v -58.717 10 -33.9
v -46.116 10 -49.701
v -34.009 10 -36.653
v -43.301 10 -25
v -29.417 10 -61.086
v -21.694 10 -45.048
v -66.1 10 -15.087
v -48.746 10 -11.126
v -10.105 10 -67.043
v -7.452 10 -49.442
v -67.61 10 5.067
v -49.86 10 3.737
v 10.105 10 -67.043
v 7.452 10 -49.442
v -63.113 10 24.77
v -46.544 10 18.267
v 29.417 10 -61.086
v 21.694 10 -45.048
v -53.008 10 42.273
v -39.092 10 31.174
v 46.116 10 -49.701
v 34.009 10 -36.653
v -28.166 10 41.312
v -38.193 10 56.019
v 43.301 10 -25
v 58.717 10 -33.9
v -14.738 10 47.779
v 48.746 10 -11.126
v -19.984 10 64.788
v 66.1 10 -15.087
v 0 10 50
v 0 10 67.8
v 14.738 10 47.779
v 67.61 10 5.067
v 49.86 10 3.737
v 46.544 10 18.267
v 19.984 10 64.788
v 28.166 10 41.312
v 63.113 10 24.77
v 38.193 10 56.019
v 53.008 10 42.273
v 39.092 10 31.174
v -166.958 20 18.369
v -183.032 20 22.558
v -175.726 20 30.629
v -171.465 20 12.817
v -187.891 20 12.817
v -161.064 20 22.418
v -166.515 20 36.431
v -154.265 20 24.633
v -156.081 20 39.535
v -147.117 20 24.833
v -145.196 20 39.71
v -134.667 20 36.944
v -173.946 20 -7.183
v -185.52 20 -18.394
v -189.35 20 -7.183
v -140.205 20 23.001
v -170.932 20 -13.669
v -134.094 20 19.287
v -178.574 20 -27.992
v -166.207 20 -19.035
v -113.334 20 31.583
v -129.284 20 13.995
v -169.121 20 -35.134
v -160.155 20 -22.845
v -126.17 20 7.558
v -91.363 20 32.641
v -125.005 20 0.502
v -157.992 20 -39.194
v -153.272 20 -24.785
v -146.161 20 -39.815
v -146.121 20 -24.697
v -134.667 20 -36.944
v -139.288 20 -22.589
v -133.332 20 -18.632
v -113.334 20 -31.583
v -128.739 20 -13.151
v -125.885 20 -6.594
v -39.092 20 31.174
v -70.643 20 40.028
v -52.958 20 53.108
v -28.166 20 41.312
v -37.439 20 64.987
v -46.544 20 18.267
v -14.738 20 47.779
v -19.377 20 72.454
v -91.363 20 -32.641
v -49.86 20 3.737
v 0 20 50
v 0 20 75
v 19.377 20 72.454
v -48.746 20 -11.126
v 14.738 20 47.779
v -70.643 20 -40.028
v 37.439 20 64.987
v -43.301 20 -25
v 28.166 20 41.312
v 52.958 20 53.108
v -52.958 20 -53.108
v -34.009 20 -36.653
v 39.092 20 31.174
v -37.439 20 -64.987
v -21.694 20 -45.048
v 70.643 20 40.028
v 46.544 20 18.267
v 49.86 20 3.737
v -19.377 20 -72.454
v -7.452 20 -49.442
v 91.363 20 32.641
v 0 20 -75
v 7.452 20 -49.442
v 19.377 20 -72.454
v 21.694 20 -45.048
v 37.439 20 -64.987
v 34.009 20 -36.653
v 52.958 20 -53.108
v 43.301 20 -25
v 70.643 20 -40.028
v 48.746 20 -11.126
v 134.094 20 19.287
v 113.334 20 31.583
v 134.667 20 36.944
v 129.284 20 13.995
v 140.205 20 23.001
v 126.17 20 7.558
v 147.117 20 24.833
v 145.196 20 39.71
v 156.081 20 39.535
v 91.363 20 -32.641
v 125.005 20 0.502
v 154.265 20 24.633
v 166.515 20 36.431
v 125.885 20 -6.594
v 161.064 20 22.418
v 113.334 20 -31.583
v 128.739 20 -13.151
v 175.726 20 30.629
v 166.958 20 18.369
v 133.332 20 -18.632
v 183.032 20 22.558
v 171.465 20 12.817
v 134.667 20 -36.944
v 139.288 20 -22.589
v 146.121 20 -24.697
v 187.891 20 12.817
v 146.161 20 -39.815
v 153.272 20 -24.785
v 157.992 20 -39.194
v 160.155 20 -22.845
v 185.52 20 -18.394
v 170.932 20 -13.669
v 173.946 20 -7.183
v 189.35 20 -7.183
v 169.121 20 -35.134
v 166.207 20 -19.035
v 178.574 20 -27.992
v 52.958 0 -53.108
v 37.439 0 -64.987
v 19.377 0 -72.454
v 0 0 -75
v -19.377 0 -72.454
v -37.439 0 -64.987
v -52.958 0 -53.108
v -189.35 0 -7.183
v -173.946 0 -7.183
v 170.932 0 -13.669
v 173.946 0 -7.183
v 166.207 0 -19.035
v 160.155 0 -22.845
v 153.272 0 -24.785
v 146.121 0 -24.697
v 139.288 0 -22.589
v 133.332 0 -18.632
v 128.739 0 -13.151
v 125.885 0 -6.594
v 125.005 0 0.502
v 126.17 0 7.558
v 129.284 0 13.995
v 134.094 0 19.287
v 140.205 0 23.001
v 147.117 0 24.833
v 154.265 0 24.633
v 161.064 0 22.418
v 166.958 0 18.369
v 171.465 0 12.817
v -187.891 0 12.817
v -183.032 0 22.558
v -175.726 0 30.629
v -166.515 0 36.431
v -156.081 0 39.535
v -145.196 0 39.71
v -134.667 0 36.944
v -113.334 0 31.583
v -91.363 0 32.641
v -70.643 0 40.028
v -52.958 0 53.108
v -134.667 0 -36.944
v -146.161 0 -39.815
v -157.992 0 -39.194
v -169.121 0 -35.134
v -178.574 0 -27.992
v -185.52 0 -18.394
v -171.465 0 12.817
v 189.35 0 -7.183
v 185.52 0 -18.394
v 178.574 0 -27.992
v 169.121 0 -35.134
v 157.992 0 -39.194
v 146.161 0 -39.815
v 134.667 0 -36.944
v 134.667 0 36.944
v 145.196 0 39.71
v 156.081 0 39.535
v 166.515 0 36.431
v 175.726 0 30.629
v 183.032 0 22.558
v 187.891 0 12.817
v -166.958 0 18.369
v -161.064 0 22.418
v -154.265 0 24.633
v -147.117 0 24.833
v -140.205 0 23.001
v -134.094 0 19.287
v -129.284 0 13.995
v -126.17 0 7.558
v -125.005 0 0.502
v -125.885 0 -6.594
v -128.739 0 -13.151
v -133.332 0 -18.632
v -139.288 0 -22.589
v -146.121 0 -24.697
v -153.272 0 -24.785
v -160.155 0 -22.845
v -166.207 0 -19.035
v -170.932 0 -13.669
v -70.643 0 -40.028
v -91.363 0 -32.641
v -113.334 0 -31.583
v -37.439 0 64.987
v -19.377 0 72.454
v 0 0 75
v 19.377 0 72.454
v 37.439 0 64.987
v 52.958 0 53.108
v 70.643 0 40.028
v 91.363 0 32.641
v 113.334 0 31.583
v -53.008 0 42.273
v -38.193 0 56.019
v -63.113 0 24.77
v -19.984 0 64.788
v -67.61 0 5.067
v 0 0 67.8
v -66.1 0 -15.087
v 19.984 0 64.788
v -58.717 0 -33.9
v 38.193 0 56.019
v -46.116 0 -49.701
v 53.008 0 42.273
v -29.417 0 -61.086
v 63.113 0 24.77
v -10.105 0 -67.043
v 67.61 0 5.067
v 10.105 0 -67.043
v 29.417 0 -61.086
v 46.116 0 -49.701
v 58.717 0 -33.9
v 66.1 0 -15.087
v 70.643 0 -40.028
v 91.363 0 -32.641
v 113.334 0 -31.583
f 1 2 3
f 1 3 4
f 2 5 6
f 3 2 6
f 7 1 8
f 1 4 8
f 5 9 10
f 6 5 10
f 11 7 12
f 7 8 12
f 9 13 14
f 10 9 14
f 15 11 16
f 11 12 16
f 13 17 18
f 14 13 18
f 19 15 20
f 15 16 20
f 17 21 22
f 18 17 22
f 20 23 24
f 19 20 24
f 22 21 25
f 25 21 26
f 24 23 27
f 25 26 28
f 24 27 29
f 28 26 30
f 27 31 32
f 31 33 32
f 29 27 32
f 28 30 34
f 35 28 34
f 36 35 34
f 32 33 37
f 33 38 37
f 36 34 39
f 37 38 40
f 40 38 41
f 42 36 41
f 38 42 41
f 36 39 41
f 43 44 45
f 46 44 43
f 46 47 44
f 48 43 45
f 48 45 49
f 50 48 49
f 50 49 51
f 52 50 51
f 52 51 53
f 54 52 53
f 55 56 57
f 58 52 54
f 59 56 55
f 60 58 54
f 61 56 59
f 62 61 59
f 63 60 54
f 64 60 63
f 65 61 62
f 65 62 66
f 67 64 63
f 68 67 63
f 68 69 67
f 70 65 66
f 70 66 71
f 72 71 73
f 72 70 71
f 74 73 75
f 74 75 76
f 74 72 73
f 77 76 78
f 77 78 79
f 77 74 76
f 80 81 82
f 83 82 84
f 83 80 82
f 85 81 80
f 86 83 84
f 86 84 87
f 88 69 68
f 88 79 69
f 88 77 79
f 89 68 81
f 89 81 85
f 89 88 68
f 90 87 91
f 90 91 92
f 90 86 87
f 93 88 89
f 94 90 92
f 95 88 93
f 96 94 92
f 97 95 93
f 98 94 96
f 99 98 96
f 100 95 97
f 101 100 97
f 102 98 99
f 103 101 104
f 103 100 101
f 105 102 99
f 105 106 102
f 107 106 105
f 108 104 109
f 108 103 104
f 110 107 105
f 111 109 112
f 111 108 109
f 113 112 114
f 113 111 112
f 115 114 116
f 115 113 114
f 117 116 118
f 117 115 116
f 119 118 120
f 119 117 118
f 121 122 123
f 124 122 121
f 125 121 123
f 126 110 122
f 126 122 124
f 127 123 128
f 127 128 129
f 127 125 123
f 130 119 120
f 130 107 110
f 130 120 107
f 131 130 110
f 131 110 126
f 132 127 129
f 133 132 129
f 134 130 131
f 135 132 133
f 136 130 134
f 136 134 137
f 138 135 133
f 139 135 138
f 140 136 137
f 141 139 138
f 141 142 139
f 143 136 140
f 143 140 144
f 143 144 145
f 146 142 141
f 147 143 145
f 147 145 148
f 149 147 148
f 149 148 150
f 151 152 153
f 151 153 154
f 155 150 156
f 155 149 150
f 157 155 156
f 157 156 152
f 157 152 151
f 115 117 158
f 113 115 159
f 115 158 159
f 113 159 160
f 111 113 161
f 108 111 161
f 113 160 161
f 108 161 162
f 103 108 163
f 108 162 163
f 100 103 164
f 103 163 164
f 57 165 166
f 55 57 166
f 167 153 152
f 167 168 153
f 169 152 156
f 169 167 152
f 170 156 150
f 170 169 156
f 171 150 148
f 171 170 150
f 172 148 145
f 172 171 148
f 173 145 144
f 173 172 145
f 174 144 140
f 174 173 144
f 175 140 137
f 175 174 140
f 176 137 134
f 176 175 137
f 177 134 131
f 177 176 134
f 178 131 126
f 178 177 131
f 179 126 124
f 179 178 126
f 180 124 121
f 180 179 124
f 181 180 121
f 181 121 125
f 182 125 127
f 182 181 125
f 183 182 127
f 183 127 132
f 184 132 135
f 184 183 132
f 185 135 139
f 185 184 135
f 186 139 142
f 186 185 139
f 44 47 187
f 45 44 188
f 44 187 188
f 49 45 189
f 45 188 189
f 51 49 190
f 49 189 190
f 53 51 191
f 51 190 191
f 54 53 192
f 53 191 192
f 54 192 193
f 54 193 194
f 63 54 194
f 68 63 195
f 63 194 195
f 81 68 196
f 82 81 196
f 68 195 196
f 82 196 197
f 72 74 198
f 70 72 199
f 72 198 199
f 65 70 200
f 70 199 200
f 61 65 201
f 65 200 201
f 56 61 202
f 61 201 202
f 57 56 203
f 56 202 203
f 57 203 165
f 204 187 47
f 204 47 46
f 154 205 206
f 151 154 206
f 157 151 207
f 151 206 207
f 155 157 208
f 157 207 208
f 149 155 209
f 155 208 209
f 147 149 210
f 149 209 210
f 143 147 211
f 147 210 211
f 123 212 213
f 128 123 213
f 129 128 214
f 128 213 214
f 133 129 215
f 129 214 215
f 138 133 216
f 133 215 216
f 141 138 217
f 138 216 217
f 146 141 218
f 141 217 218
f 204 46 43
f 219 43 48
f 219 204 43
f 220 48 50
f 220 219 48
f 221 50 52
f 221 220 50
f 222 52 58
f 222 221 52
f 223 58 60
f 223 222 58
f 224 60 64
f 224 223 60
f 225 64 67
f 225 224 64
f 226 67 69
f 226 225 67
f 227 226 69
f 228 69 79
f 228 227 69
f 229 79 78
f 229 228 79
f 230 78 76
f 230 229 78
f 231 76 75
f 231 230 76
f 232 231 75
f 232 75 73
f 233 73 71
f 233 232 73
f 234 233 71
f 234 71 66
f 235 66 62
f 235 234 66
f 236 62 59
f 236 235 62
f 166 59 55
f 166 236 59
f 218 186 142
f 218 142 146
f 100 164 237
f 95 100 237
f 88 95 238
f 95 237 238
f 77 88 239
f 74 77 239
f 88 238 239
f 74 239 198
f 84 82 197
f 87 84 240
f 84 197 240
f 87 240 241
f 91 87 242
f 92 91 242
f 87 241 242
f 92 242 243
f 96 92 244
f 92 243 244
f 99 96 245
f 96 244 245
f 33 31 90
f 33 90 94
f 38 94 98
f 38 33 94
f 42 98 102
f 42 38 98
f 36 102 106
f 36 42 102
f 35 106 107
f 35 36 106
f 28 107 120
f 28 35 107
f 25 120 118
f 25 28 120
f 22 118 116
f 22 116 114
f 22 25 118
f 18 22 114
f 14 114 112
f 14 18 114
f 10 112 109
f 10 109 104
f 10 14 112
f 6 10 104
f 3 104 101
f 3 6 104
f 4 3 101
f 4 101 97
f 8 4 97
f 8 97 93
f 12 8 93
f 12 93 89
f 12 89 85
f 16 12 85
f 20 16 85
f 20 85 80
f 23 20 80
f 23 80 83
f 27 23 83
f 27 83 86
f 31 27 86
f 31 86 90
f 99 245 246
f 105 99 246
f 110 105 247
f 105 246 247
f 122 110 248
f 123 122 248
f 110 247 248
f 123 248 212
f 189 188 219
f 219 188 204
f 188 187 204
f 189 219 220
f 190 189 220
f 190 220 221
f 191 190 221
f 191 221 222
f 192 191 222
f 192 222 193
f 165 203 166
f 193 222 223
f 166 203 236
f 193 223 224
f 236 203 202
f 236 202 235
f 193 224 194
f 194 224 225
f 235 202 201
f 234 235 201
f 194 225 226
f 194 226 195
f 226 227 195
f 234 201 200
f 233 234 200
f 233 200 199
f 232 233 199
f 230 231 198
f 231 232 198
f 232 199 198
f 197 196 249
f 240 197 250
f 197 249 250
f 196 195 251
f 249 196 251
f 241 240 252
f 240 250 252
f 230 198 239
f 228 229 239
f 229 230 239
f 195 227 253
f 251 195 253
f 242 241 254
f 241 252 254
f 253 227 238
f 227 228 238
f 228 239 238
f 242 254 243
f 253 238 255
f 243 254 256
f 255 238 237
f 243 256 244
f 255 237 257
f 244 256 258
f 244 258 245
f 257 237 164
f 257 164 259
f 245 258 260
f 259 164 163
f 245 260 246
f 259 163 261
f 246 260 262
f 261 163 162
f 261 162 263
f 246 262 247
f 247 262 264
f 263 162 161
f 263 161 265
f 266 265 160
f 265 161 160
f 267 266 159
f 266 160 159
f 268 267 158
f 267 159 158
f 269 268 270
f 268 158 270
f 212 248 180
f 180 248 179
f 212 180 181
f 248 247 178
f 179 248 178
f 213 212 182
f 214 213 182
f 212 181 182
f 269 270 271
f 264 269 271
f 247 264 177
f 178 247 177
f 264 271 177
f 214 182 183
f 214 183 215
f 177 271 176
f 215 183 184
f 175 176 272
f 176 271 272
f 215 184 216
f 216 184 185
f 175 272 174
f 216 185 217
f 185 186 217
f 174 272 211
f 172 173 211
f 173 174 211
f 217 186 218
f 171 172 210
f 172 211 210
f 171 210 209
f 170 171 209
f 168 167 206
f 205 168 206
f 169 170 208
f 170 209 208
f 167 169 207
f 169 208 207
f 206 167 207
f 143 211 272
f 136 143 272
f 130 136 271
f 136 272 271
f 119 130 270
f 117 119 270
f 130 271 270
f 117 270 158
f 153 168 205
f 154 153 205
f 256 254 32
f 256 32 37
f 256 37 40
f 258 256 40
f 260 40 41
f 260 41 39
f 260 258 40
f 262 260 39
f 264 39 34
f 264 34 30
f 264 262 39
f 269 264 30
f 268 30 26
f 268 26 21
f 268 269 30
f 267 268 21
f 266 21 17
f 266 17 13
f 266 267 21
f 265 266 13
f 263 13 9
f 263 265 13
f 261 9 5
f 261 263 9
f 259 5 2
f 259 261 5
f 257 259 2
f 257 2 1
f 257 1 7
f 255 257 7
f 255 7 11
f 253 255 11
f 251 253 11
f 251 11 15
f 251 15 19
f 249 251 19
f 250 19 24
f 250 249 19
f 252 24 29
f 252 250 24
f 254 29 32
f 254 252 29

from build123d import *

# Parameters (mm, degrees)
SKETCH6_R           = 50
SKETCH6_R_2         = 25
BOSS_EXTRUDE6_DEPTH = 20
SKETCH6_8_R         = 67.8
CUT_EXTRUDE11_DEPTH = 10
SKETCH9_W           = 21.167456462
SKETCH9_H           = 20
CUT_EXTRUDE13_DEPTH = 30


with BuildPart() as part:
    # Sketch6 → Boss-Extrude6 (new body)
    with BuildSketch(Plane(origin=(0, 0, 0), x_dir=(1, 0, 0), z_dir=(0, 1, 0))):
        with BuildLine():
            ThreePointArc((-52.958333333, -53.107578843), (0, -75), (52.958333333, -53.107578843))
            ThreePointArc((52.958333333, -53.107578843), (91.362529225, -32.640861336), (134.666666667, -36.944402673))
            ThreePointArc((134.666666667, -36.944402673), (190, 0), (134.666666667, 36.944402673))
            ThreePointArc((134.666666667, 36.944402673), (91.362529225, 32.640861336), (52.958333333, 53.107578843))
            ThreePointArc((52.958333333, 53.107578843), (0, 75), (-52.958333333, 53.107578843))
            ThreePointArc((-52.958333333, 53.107578843), (-91.362529225, 32.640861336), (-134.666666667, 36.944402673))
            ThreePointArc((-134.666666667, 36.944402673), (-190, 0), (-134.666666667, -36.944402673))
            ThreePointArc((-134.666666667, -36.944402673), (-91.362529225, -32.640861336), (-52.958333333, -53.107578843))
        make_face()
        Circle(SKETCH6_R, mode=Mode.SUBTRACT)
        with Locations((150, 0)):
            Circle(SKETCH6_R_2, mode=Mode.SUBTRACT)
        with Locations((-150, 0)):
            Circle(SKETCH6_R_2, mode=Mode.SUBTRACT)
    extrude(amount=BOSS_EXTRUDE6_DEPTH)

    # Sketch6<8> → Cut-Extrude11 (cut)
    with BuildSketch(Plane(origin=(0, 0, 0), x_dir=(1, 0, 0), z_dir=(0, 1, 0))):
        Circle(SKETCH6_8_R)
    extrude(amount=CUT_EXTRUDE11_DEPTH, mode=Mode.SUBTRACT)

    # Sketch9 → Cut-Extrude13 (cut)
    with BuildSketch(Plane.XZ):
        with Locations((181.273098249, 2.816509548)):
            Rectangle(SKETCH9_W, SKETCH9_H)
        with Locations((-181.273098249, 2.816509548)):
            Rectangle(SKETCH9_W, SKETCH9_H)
    extrude(amount=-CUT_EXTRUDE13_DEPTH, mode=Mode.SUBTRACT)


solid = part.part
